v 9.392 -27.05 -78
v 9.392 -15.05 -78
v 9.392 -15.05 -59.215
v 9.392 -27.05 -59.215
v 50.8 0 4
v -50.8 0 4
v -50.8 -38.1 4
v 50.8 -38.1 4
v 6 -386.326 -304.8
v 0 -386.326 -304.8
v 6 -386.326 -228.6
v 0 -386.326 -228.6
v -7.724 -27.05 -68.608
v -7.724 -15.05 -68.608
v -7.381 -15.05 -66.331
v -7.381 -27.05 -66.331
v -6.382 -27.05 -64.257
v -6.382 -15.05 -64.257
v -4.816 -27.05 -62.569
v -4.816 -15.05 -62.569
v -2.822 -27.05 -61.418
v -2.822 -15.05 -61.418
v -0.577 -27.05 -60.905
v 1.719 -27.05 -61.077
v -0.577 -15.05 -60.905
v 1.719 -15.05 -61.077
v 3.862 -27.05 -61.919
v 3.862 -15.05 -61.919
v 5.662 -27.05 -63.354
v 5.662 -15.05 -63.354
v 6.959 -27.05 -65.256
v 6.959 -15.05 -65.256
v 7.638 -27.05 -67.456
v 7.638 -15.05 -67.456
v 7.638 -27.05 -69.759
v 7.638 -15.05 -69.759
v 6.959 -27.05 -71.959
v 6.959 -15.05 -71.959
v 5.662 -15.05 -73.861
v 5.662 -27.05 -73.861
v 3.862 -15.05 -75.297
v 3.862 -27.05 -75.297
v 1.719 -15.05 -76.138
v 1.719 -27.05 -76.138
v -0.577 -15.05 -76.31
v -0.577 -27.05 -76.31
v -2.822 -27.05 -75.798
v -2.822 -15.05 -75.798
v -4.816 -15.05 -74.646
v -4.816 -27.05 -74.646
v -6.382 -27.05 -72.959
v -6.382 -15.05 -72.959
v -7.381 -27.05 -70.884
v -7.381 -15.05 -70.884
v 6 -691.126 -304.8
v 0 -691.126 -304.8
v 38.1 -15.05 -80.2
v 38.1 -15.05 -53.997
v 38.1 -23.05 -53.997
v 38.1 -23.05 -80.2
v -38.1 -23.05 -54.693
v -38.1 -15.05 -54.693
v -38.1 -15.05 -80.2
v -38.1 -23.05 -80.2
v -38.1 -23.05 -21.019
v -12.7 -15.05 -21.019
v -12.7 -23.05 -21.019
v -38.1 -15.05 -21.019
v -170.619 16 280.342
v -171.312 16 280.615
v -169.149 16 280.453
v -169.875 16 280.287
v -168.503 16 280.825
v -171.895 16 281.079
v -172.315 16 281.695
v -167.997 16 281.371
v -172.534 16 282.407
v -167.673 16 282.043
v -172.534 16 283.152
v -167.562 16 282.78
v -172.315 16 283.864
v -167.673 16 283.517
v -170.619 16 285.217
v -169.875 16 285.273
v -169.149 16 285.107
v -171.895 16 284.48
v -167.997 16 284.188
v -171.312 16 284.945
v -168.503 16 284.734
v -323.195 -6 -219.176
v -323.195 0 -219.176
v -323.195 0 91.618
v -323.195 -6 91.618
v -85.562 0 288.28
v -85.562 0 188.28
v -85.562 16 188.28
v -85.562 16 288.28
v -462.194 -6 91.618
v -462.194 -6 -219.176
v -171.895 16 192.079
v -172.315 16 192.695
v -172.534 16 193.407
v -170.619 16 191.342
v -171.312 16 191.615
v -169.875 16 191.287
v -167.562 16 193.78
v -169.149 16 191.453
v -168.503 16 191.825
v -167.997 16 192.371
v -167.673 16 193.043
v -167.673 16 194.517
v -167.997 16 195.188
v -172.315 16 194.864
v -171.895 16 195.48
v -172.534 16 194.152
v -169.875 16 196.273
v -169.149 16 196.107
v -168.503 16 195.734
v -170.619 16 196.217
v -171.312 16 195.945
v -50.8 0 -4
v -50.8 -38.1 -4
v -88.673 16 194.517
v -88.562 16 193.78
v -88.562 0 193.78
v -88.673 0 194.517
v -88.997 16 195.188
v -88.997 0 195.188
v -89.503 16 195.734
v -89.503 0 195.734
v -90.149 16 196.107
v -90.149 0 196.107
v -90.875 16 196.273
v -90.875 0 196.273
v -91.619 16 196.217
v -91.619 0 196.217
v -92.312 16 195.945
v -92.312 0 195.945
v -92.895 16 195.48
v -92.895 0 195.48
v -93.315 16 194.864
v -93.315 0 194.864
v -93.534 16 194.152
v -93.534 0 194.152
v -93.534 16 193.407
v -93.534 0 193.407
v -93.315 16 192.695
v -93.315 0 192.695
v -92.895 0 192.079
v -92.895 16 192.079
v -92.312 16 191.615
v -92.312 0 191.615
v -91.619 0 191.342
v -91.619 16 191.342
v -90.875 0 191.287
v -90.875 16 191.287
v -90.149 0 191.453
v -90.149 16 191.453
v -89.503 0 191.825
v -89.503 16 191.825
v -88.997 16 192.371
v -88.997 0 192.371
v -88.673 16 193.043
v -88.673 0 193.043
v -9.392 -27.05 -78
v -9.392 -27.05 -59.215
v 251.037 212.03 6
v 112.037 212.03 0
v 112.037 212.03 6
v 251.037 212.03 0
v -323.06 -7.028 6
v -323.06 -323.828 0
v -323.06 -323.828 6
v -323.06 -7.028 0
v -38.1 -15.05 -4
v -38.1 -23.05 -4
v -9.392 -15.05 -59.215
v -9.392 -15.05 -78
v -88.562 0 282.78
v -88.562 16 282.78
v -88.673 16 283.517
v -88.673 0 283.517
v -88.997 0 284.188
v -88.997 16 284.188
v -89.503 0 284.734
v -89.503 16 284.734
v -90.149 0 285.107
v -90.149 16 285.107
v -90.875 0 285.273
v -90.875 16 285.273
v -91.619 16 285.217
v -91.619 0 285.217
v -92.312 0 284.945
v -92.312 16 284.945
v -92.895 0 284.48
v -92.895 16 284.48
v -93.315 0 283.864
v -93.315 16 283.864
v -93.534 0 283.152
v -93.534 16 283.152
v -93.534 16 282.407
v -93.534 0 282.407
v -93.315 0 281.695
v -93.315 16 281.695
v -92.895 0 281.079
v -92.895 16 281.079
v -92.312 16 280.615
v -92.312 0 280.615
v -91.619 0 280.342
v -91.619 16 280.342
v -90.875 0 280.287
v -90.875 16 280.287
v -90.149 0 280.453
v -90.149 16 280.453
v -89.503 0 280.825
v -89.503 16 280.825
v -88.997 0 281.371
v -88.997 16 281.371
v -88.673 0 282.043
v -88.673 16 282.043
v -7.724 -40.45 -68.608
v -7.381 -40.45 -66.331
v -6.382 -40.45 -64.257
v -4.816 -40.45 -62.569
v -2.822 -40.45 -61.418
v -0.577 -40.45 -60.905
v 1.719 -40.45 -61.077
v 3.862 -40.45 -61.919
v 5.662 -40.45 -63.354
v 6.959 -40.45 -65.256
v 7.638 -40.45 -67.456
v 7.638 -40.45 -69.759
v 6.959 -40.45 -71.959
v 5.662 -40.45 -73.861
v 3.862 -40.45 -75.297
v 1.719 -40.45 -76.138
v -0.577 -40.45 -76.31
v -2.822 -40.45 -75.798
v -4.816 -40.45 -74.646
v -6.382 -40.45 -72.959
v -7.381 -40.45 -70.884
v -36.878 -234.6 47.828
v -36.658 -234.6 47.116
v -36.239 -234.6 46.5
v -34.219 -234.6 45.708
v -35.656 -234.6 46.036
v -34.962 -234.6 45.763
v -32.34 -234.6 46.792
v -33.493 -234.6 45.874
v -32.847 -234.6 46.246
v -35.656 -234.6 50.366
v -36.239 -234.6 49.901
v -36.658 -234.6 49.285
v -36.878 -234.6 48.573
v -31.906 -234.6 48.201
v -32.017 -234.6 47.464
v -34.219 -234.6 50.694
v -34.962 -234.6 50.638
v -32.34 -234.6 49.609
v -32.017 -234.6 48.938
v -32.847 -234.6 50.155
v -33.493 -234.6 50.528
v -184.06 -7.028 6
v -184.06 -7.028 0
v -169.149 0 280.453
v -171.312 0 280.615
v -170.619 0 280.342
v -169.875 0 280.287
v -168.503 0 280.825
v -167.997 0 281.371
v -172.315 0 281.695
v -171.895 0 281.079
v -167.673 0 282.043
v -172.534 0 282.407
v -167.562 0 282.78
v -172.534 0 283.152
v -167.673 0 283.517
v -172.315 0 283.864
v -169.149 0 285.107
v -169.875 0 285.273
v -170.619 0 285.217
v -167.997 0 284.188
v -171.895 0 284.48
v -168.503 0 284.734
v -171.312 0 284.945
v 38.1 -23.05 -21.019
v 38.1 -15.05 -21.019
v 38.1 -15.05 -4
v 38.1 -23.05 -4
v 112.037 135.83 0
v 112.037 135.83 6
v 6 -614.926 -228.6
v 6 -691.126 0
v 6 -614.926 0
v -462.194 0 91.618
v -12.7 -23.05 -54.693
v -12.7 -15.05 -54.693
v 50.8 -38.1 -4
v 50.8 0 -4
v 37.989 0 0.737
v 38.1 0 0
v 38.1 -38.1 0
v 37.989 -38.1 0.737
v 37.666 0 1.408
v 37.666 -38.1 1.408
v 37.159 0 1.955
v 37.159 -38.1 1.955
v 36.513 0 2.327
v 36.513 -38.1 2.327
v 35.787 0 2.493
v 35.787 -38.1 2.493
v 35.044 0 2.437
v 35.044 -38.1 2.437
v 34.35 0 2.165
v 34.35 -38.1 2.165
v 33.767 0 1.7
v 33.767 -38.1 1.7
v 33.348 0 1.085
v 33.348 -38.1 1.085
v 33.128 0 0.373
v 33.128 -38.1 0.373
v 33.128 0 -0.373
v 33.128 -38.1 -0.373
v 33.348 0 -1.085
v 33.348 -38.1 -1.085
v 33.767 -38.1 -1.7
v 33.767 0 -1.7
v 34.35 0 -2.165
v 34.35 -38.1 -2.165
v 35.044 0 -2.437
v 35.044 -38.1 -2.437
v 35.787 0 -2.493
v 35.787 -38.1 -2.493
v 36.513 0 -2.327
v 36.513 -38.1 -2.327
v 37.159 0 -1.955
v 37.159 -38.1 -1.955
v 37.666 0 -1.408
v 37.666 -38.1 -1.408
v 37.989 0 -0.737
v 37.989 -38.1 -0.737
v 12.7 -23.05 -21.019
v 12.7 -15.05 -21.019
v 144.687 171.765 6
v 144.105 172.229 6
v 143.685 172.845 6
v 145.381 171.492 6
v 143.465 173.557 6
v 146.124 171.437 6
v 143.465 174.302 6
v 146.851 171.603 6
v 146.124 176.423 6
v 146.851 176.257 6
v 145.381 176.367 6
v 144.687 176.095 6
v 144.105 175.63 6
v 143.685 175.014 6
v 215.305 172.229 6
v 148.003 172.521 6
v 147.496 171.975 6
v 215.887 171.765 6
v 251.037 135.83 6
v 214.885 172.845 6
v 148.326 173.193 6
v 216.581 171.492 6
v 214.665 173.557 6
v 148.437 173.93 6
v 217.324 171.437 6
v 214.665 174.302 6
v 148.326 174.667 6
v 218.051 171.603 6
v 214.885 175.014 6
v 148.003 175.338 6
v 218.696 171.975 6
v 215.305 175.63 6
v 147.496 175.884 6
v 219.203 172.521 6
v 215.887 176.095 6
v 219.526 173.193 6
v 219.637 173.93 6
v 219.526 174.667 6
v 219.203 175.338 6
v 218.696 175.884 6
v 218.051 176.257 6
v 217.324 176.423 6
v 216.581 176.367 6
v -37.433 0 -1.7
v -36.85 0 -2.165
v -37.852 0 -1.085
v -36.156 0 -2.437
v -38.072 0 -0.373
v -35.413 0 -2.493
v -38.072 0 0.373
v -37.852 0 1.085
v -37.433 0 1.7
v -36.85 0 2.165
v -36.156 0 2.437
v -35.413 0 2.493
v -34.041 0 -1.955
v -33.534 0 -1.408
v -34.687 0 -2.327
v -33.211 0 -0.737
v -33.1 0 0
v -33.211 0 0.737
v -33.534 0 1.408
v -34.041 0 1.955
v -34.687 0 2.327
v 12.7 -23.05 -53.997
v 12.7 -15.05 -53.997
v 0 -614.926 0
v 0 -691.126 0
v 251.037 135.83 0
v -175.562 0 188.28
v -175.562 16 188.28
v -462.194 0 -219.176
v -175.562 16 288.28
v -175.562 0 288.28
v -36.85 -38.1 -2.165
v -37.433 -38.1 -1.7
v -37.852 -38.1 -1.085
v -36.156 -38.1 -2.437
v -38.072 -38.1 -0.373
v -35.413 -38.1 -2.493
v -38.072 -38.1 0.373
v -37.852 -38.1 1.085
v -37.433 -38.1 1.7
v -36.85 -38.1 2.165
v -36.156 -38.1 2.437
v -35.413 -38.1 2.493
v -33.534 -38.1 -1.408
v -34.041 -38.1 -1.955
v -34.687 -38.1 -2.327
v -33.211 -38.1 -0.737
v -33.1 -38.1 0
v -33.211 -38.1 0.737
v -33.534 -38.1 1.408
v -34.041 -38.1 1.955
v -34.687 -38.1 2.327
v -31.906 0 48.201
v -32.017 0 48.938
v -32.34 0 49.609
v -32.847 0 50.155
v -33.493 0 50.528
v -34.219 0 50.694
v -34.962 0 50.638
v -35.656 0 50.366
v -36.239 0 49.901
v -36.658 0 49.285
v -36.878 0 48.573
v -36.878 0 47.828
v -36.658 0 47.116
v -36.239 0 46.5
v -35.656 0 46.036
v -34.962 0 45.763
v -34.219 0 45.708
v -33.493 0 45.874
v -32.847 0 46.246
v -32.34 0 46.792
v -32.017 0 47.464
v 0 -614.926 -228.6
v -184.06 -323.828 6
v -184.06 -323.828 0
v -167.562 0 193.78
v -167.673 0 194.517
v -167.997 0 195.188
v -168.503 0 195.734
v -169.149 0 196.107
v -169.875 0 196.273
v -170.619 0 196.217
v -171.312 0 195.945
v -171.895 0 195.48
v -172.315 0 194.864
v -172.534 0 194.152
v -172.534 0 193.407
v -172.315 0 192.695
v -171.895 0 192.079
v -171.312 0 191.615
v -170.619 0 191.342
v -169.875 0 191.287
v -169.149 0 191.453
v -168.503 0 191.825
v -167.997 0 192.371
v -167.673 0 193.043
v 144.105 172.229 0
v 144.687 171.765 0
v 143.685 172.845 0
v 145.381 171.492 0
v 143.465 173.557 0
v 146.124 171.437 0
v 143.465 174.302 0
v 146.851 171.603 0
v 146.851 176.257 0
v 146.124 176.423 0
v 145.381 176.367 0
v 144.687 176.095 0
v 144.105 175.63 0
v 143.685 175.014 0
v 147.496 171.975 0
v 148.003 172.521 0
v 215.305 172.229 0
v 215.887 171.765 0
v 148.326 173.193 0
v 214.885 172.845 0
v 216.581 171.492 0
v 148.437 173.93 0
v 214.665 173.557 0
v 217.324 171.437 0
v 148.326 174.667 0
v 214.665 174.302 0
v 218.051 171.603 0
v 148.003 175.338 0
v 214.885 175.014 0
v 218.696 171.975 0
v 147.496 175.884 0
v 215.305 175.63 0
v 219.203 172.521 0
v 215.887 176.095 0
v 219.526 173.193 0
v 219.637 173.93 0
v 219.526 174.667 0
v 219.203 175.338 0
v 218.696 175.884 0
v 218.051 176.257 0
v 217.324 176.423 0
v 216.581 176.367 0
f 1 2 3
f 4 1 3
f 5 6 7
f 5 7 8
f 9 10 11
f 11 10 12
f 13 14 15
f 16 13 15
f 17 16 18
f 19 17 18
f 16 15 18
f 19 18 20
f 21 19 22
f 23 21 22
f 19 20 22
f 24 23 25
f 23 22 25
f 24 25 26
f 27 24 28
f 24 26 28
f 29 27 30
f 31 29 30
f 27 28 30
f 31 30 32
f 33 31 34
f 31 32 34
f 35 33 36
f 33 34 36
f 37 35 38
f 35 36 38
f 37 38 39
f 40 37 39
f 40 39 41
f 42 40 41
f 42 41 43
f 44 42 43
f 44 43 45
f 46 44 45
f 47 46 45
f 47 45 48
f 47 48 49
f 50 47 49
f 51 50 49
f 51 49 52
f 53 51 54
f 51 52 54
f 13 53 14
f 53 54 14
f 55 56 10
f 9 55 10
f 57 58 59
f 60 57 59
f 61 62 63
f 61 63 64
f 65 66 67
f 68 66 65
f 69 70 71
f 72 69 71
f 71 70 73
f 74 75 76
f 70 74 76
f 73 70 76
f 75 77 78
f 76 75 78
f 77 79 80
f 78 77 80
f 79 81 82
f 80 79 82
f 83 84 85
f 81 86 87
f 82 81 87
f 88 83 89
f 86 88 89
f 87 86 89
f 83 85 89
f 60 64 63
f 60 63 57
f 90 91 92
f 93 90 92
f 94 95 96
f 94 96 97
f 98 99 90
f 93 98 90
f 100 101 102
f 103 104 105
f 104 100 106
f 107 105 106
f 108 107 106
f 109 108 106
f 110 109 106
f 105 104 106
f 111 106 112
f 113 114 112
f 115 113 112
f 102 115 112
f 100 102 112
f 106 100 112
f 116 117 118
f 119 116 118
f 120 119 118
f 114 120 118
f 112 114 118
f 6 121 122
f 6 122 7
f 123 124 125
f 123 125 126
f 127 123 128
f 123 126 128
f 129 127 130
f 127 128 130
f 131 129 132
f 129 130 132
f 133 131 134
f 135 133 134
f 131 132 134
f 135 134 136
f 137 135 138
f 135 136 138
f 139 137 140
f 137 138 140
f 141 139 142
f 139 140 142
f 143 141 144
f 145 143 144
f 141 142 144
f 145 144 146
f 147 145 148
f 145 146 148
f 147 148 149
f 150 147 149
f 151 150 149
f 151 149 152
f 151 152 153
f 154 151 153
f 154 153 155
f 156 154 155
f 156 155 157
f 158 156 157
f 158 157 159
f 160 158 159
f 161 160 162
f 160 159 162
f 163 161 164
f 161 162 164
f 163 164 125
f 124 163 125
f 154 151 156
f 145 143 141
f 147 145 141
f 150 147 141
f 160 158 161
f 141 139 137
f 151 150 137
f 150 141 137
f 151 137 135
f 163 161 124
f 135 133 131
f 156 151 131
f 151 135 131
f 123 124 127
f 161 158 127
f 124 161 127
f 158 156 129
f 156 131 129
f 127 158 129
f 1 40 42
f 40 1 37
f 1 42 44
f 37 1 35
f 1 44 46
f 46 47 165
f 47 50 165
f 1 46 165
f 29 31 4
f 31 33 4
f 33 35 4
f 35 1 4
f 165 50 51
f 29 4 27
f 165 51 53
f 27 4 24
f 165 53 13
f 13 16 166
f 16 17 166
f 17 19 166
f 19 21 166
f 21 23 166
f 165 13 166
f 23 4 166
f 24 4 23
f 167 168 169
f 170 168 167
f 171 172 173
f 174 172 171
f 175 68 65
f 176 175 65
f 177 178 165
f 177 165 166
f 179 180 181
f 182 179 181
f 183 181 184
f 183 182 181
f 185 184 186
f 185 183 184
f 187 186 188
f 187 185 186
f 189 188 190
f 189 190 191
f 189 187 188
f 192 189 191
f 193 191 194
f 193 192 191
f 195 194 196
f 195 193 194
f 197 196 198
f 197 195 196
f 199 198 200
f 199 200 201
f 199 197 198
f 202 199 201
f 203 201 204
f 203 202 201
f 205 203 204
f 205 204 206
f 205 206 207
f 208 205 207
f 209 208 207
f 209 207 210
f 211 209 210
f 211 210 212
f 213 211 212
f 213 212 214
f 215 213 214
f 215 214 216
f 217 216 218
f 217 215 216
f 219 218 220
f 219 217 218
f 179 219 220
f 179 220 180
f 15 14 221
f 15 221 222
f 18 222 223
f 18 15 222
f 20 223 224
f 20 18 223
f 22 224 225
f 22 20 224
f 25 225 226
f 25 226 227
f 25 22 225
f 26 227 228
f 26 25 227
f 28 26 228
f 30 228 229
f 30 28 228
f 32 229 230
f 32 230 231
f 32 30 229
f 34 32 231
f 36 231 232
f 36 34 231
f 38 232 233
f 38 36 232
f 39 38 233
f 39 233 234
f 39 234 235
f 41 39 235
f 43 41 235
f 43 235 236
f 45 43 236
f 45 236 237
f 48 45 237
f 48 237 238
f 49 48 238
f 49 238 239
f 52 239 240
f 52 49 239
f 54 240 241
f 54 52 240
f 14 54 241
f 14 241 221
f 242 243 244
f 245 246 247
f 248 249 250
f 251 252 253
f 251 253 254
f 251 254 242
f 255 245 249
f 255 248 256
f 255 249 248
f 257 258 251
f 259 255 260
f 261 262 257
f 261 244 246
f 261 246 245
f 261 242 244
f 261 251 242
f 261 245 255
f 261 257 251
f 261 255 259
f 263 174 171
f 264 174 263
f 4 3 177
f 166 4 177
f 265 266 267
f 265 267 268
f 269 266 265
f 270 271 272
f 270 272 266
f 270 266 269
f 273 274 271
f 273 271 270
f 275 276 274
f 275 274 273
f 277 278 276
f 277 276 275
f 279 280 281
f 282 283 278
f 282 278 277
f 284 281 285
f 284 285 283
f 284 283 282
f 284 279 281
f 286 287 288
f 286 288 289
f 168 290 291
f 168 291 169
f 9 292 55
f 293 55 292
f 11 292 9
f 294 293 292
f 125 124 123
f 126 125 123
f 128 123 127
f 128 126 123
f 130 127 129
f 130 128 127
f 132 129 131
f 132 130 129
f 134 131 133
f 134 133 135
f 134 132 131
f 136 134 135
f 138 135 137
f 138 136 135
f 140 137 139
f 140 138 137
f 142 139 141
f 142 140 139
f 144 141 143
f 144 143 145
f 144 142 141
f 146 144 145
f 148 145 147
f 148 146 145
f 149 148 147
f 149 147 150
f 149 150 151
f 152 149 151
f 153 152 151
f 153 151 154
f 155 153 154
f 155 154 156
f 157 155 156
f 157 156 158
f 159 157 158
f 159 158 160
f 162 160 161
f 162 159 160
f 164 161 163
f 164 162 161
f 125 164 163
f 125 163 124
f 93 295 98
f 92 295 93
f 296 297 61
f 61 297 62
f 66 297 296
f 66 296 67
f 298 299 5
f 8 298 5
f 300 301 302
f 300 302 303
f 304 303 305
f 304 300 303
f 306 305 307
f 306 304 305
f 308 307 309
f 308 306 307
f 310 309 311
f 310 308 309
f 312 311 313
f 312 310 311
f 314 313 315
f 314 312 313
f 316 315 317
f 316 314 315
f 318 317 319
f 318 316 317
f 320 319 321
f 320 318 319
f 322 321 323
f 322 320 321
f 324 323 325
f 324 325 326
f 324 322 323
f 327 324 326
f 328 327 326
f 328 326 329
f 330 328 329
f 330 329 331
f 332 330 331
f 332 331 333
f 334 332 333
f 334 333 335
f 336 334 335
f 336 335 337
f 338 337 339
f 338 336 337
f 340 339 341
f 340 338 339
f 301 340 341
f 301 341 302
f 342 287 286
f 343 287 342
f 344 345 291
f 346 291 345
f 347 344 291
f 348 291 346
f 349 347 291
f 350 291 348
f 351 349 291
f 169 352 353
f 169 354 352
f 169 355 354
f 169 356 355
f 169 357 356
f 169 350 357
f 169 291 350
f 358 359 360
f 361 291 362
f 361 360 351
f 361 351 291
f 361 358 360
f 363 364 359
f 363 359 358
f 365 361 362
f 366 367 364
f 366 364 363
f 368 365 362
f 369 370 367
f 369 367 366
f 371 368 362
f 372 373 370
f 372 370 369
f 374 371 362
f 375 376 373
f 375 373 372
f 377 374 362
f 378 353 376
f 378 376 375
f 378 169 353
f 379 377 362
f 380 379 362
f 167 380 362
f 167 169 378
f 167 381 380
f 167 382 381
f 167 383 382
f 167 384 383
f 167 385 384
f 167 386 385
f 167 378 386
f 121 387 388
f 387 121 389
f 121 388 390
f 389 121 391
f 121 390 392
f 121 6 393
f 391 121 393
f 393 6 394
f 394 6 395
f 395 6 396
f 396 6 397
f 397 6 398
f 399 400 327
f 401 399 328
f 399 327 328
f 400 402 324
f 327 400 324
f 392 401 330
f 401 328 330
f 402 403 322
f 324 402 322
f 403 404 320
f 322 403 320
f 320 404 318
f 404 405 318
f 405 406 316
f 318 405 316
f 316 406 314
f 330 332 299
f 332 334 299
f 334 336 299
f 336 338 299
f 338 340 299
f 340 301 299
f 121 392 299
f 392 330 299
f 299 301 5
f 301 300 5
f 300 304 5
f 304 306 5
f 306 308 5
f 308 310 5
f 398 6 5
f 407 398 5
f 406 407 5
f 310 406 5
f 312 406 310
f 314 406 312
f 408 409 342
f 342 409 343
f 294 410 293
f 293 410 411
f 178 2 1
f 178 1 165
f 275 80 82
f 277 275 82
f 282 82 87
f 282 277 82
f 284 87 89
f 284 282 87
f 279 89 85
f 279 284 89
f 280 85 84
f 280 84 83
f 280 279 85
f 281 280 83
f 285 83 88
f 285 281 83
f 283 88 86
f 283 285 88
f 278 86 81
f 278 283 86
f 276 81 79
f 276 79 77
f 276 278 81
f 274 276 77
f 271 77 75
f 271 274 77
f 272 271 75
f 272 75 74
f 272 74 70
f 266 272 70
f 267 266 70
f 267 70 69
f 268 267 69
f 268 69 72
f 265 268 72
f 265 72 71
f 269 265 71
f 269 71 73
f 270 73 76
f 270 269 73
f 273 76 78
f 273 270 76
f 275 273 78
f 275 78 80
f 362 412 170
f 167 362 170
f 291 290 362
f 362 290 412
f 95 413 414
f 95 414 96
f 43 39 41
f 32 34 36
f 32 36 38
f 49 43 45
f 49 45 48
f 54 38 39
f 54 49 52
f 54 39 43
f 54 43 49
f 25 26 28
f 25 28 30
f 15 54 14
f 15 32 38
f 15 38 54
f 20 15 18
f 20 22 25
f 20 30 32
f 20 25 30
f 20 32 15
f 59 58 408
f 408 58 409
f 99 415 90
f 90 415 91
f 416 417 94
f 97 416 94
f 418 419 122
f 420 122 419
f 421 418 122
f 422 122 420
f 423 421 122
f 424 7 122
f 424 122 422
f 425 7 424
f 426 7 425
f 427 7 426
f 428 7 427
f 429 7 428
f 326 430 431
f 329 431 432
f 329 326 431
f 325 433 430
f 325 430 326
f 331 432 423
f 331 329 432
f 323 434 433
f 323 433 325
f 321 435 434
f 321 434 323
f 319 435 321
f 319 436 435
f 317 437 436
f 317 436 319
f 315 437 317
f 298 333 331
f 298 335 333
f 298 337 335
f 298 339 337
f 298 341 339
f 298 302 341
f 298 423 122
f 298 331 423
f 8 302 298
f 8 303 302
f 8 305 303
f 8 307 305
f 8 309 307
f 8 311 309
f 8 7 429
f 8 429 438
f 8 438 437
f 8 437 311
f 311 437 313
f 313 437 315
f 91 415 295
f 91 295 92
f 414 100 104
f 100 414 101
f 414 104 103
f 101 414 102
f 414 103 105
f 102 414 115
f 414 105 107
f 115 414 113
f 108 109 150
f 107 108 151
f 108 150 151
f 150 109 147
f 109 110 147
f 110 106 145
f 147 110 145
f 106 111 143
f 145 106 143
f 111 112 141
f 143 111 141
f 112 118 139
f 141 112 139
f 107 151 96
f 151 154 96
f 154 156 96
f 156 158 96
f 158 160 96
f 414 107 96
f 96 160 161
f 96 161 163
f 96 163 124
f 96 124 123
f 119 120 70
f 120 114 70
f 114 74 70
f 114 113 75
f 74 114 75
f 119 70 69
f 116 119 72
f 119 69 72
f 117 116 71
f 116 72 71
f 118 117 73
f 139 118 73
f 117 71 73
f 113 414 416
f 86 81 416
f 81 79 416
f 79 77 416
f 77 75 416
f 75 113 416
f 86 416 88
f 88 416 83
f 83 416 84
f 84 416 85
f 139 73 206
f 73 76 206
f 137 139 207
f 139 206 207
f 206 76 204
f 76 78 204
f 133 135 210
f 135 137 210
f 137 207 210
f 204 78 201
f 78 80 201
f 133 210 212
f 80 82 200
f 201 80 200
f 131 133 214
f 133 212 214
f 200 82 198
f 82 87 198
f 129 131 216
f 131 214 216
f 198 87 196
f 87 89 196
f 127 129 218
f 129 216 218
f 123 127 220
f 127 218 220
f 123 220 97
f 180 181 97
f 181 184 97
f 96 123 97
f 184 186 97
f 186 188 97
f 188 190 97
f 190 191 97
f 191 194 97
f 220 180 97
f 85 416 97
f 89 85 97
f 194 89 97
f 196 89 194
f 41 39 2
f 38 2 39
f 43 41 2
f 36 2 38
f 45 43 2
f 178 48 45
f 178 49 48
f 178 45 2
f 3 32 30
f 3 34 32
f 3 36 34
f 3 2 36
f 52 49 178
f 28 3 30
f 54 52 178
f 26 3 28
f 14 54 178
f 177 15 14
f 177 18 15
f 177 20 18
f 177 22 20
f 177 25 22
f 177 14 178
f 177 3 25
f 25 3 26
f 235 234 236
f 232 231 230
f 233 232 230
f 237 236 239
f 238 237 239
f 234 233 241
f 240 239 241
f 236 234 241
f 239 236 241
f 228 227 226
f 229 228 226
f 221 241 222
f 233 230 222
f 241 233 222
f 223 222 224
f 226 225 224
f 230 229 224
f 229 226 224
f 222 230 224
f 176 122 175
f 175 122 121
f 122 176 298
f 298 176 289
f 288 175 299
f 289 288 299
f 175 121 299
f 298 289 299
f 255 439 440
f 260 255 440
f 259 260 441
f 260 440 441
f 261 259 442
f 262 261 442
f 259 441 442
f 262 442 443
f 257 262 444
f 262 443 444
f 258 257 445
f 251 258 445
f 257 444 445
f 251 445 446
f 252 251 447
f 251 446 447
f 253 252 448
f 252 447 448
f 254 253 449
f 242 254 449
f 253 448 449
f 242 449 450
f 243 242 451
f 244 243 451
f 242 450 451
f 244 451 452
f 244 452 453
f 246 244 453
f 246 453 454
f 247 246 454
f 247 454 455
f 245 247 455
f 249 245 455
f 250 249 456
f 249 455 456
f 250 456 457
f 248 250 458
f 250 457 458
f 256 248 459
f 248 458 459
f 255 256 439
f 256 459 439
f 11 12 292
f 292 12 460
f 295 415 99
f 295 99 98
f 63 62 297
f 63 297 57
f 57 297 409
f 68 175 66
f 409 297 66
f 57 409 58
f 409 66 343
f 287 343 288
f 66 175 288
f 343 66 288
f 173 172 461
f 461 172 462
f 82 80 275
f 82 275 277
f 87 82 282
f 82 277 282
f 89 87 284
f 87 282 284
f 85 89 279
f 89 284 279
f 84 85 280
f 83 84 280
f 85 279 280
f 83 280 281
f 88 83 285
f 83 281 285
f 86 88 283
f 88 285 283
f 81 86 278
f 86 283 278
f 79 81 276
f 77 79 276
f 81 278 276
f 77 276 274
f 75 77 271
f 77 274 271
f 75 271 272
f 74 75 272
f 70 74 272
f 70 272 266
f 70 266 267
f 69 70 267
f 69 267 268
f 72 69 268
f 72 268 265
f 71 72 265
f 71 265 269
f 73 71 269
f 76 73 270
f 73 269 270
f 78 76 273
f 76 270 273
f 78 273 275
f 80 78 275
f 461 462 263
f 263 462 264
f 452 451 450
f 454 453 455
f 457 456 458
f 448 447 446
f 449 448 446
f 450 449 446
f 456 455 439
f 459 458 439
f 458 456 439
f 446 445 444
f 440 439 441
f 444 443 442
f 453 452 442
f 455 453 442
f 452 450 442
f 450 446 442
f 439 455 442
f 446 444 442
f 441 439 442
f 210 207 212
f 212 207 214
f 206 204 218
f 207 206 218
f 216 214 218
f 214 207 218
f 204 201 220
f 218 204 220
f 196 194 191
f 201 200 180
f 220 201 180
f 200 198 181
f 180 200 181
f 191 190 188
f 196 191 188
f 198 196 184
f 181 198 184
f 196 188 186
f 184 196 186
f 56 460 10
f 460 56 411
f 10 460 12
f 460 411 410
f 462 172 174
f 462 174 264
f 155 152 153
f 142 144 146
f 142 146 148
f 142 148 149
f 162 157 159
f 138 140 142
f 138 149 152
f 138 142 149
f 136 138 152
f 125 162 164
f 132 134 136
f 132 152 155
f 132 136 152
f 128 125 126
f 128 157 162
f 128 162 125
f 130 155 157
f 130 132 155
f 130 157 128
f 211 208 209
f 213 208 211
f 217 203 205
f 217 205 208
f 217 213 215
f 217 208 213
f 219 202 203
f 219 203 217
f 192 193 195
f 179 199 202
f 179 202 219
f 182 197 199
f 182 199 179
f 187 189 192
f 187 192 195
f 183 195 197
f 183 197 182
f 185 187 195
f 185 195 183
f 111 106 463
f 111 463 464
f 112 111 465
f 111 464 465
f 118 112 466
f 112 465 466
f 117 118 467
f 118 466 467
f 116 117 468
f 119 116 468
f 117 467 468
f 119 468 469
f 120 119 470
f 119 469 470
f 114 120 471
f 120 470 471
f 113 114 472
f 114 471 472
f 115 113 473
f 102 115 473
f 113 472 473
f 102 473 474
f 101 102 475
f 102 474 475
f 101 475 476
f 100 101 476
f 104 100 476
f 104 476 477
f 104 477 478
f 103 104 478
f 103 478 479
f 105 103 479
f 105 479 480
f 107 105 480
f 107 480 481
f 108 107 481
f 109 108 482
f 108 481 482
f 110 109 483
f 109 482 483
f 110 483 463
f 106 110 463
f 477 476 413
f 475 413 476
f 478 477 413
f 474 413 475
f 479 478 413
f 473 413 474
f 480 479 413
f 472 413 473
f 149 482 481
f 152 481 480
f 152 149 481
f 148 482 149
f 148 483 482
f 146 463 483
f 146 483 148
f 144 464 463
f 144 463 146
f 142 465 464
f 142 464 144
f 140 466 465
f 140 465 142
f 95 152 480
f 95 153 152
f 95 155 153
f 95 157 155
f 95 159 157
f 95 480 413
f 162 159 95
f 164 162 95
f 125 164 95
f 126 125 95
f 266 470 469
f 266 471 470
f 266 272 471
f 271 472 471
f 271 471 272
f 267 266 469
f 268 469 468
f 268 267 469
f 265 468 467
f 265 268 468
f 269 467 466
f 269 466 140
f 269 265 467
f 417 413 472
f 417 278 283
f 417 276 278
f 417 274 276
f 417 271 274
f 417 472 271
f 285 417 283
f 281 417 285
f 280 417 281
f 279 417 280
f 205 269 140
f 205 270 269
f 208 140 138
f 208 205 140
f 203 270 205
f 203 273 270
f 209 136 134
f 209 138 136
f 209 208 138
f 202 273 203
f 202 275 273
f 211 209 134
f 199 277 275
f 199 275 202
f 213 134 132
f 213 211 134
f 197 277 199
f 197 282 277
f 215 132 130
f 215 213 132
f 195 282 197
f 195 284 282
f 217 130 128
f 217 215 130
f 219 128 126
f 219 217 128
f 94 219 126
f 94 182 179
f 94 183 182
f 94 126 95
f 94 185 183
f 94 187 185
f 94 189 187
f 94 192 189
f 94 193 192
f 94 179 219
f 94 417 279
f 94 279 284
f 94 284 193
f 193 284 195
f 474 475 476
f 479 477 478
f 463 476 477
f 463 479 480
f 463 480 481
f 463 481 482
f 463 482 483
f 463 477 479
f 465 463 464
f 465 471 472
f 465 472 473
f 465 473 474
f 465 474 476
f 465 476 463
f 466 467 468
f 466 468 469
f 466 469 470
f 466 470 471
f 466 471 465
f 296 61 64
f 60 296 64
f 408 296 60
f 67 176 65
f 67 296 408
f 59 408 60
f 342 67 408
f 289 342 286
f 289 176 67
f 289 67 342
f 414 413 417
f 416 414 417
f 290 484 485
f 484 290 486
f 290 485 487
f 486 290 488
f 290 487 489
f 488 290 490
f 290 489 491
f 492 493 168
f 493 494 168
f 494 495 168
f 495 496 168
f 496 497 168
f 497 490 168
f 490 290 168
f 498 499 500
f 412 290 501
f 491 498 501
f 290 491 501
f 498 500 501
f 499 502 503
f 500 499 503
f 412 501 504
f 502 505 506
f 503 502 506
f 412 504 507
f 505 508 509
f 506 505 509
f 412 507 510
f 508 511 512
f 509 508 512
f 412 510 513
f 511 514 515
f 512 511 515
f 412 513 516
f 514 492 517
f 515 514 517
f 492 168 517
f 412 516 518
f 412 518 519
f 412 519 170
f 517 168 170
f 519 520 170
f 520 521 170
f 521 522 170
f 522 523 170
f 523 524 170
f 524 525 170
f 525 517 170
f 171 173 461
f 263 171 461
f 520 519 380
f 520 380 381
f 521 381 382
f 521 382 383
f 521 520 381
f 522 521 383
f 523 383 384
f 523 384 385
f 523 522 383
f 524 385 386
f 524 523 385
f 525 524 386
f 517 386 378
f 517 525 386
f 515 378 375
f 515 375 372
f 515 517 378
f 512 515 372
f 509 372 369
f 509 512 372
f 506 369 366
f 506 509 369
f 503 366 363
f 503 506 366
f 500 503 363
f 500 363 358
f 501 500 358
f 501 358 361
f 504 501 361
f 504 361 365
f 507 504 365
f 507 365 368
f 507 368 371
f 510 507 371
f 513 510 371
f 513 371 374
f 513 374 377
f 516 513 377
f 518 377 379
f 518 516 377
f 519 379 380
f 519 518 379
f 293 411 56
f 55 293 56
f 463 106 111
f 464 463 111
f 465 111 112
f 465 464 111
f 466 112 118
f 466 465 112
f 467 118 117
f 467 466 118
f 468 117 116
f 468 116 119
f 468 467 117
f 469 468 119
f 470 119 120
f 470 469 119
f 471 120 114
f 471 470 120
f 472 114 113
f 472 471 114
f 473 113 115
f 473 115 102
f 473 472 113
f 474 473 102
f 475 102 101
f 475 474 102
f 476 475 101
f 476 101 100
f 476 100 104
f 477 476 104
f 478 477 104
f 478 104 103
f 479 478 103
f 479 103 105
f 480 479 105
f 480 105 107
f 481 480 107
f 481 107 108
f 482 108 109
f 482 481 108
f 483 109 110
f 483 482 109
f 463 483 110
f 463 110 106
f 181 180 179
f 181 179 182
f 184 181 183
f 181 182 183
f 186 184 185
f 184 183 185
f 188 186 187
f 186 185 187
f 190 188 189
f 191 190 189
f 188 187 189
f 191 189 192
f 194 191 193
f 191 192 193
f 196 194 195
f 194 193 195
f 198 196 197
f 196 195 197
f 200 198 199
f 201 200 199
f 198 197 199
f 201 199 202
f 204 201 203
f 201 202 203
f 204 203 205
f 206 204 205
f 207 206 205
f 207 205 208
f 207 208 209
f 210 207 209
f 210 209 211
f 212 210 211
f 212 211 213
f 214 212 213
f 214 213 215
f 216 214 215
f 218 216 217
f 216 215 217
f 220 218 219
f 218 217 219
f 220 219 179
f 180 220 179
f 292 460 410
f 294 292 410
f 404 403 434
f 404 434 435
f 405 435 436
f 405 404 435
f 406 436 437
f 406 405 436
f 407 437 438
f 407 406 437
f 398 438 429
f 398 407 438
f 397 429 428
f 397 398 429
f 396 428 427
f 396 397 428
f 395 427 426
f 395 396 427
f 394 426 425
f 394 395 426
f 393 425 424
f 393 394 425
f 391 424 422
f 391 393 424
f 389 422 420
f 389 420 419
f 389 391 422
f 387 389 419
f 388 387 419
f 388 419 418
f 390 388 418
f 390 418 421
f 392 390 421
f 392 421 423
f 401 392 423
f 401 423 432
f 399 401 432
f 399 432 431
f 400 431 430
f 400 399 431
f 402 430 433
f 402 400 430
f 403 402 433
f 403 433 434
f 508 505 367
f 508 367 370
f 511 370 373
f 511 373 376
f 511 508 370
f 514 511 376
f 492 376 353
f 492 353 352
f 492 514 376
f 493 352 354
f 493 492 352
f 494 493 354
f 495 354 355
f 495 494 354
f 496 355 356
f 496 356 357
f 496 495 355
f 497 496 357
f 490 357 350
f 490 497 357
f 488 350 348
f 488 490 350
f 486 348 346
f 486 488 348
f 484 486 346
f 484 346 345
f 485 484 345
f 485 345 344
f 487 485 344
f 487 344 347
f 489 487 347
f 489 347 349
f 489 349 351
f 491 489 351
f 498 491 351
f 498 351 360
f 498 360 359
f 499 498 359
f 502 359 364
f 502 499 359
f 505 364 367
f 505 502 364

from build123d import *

# Parameters (mm, degrees)
F0_W      = 101.6
F0_H      = 8
F0_R      = 2.5
F1_DEPTH  = 38.1
F2_R      = 2.5
F3_DEPTH  = 234.6
F5_DEPTH  = 6
F6_W      = 138.99896
F6_H      = 310.7944
F7_DEPTH  = 6
F8_W      = 139
F8_H      = 316.8
F9_DEPTH  = 6
F10_W     = 139
F10_H     = 76.2
F10_R     = 2.5
F11_DEPTH = 6
F12_W     = 90
F12_H     = 100
F12_R     = 2.5
F13_DEPTH = 16
F14_DEPTH = 16
F15_W     = 76.2
F15_H     = 8
F16_DEPTH = 76.2
F17_W     = 25.4
F17_H     = 32.9780355096
F17_H_2   = 33.673774451
F18_DEPTH = 676.0766565222
F17_W_2   = 18.7849588692
F17_H_3   = 18.7849588692
F17_R     = 7.7239634119
F19_DEPTH = 12
F17_R_2   = 5.4539048991
F20_DEPTH = 25.4


# Not quite as in the source:
# - a feature of the source that left no trace in its solid (it failed there, or was rolled back) is left out


with BuildPart() as f1:
    # F0 (on Front) → F1 (new body)
    with BuildSketch(Plane.XZ):
        Rectangle(F0_W, F0_H)
        with Locations((-35.6, 0)):
            Circle(F0_R, mode=Mode.SUBTRACT)
        with Locations((35.6, 0)):
            Circle(F0_R, mode=Mode.SUBTRACT)
    extrude(amount=F1_DEPTH)

    # F15 (on face) → F16 (join)
    with BuildSketch(Plane(origin=(0, 0, -4), x_dir=(1, 0, 0), z_dir=(0, 0, -1))):
        with Locations((0, 19.05)):
            Rectangle(F15_W, F15_H)
    extrude(amount=F16_DEPTH)

    # F17 (on face) → F18 (cut, through all)
    with BuildSketch(Plane(origin=(0, -15.05, 0), x_dir=(-1, 0, 0), z_dir=(0, 1, 0))):
        with Locations((-25.4, -37.508122623)):
            Rectangle(F17_W, F17_H)
        with Locations((25.4, -37.8559920937)):
            Rectangle(F17_W, F17_H_2)
    extrude(amount=-F18_DEPTH, mode=Mode.SUBTRACT)


with BuildPart() as f3:
    # F2 (on Front) → F3 (new body)
    with BuildSketch(Plane.XZ):
        with Locations((-34.4059243798, 48.2007525861)):
            Circle(F2_R)
    extrude(amount=F3_DEPTH)


with BuildPart() as f5:
    # F4 (on Right) → F5 (new body)
    with BuildSketch(Plane.YZ):
        Polygon((-614.9256565222, -228.6), (-614.9256565222, 0), (-691.1256565222, 0), (-691.1256565222, -304.8), (-386.3256565222, -304.8), (-386.3256565222, -228.6), align=None)
    extrude(amount=F5_DEPTH)


with BuildPart() as f7:
    # F6 (on Front) → F7 (new body)
    with BuildSketch(Plane.XZ):
        with Locations((-392.6940560341, -63.7792117634)):
            Rectangle(F6_W, F6_H)
    extrude(amount=F7_DEPTH)


with BuildPart() as f9:
    # F8 (on Top) → F9 (new body)
    with BuildSketch(Plane.XY):
        with Locations((-253.5598740487, -165.4277235146)):
            Rectangle(F8_W, F8_H)
    extrude(amount=F9_DEPTH)


with BuildPart() as f11:
    # F10 (on Top) → F11 (new body)
    with BuildSketch(Plane.XY):
        with Locations((181.5372826105, 173.9297149658)):
            Rectangle(F10_W, F10_H)
        with Locations((145.9372826105, 173.9297149658)):
            Circle(F10_R, mode=Mode.SUBTRACT)
        with Locations((217.1372826105, 173.9297149658)):
            Circle(F10_R, mode=Mode.SUBTRACT)
    extrude(amount=F11_DEPTH)


with BuildPart() as f13:
    # F12 (on Front) → F13 (new body)
    with BuildSketch(Plane.XZ):
        with Locations((-130.562209487, 238.2797680418)):
            Rectangle(F12_W, F12_H)
        with Locations((-170.062209487, 193.7797680418)):
            Circle(F12_R, mode=Mode.SUBTRACT)
        with Locations((-91.062209487, 193.7797680418)):
            Circle(F12_R, mode=Mode.SUBTRACT)
        with Locations((-170.062209487, 282.7797680418)):
            Circle(F12_R, mode=Mode.SUBTRACT)
        with Locations((-91.062209487, 282.7797680418)):
            Circle(F12_R, mode=Mode.SUBTRACT)
    extrude(amount=-F13_DEPTH)


with BuildPart() as f14:
    # F12 (on Front) → F14 (new body)
    with BuildSketch(Plane.XZ):
        with Locations((-170.062209487, 282.7797680418)):
            Circle(F12_R)
    extrude(amount=-F14_DEPTH)


with BuildPart() as f14b:
    # F12 (on Front) → F14, piece 2 (new body)
    with BuildSketch(Plane.XZ):
        with Locations((-91.062209487, 282.7797680418)):
            Circle(F12_R)
    extrude(amount=-F14_DEPTH)


with BuildPart() as f14c:
    # F12 (on Front) → F14, piece 3 (new body)
    with BuildSketch(Plane.XZ):
        with Locations((-91.062209487, 193.7797680418)):
            Circle(F12_R)
    extrude(amount=-F14_DEPTH)


with BuildPart() as f14d:
    # F12 (on Front) → F14, piece 4 (new body)
    with BuildSketch(Plane.XZ):
        with Locations((-170.062209487, 193.7797680418)):
            Circle(F12_R)
    extrude(amount=-F14_DEPTH)


with BuildPart() as f19:
    # F17 (on face) → F19 (new body)
    with BuildSketch(Plane(origin=(0, -15.05, 0), x_dir=(-1, 0, 0), z_dir=(0, 1, 0))):
        with Locations((0, -68.6076581478)):
            Rectangle(F17_W_2, F17_H_3)
        with Locations((0, -68.6076581478)):
            Circle(F17_R, mode=Mode.SUBTRACT)
    extrude(amount=-F19_DEPTH)


with BuildPart() as f20:
    # F17 (on face) → F20 (new body)
    with BuildSketch(Plane(origin=(0, -15.05, 0), x_dir=(-1, 0, 0), z_dir=(0, 1, 0))):
        with Locations((0, -68.6076581478)):
            Circle(F17_R)
        with Locations((0, -68.6076581478)):
            Circle(F17_R_2, mode=Mode.SUBTRACT)
        with Locations((0, -68.6076581478)):
            Circle(F17_R_2)
    extrude(amount=-F20_DEPTH)


solid = Compound([f1.part, f3.part, f5.part, f7.part, f9.part, f11.part, f13.part, f14.part, f14b.part, f14c.part, f14d.part, f19.part, f20.part])
